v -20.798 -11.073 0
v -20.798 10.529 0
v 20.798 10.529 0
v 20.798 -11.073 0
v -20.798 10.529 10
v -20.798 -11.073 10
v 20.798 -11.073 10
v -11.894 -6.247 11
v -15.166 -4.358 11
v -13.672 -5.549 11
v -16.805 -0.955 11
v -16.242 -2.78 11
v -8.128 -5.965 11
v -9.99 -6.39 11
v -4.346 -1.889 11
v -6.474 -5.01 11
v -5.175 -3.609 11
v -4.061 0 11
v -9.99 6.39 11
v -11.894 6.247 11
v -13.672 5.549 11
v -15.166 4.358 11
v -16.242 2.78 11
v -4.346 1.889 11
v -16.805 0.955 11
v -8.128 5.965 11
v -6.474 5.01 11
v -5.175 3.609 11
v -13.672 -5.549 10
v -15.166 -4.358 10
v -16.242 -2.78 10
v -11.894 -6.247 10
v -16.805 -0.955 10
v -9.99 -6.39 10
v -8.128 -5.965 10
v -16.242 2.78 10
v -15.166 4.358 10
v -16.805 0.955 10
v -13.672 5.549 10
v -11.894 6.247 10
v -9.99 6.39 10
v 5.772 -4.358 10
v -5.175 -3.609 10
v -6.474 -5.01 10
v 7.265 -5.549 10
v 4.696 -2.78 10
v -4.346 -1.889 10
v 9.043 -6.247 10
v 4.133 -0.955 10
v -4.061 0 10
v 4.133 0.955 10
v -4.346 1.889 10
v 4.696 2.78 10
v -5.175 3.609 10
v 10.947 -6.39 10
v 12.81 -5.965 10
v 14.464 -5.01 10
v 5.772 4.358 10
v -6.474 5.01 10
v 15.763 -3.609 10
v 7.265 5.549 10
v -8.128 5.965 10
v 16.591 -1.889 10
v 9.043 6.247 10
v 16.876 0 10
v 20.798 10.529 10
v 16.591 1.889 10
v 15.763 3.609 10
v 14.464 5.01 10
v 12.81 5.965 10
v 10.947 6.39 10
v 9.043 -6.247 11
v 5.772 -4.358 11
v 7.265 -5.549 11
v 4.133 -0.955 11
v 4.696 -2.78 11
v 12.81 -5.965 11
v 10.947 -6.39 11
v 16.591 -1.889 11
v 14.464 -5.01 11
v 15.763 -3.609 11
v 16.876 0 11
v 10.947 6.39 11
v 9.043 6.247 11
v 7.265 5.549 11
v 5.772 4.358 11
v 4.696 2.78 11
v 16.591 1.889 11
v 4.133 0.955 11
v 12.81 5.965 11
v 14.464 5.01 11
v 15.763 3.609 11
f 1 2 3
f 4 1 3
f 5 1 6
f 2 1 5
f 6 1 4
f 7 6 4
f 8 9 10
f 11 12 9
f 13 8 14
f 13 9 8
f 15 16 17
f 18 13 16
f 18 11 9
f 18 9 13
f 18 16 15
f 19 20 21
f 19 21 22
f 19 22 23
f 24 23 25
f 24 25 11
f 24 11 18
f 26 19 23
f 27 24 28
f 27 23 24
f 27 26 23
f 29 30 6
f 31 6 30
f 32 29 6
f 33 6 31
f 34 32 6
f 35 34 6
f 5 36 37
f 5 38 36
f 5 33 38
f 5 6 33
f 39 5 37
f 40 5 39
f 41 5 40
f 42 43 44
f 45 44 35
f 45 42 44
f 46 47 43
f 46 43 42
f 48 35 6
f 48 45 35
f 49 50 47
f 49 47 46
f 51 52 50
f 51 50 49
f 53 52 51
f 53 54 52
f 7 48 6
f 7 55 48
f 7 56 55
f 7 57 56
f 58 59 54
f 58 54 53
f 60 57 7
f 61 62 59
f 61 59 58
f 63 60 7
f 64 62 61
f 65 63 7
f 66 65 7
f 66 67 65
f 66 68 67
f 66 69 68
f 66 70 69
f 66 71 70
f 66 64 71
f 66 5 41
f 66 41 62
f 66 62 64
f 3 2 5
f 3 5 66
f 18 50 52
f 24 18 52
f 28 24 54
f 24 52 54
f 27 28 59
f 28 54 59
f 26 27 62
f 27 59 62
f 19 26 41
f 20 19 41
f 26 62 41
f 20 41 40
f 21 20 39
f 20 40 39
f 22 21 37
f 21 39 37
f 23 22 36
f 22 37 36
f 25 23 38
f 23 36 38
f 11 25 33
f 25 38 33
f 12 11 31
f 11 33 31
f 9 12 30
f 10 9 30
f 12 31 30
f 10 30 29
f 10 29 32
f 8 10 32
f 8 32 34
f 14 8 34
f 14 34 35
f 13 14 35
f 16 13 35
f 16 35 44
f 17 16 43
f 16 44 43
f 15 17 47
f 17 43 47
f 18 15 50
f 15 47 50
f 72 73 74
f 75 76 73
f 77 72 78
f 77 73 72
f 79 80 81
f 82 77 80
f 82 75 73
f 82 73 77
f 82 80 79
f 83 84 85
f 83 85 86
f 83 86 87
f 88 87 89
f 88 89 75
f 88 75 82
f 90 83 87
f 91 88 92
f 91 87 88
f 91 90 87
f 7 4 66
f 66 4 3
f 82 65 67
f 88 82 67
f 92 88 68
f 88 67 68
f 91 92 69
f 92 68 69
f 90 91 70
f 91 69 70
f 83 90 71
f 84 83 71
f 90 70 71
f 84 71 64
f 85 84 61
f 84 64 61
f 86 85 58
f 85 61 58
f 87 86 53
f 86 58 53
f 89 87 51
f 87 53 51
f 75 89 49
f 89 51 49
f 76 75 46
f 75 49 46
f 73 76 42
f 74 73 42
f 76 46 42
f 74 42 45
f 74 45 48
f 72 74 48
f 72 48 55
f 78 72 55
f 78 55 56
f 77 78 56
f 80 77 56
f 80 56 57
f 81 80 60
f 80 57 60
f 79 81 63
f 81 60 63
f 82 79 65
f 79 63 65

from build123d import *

# Parameters (mm, degrees)
EXPORT_W     = 41.596402
EXPORT_H     = 21.602024
PAD_DEPTH    = 10
EXPORT001_R  = 6.407439
PAD001_DEPTH = 1


with BuildPart() as part:
    # Export → Pad (new body)
    with BuildSketch(Plane.XY):
        with Locations((0, -0.272073)):
            Rectangle(EXPORT_W, EXPORT_H)
    extrude(amount=PAD_DEPTH)

    # Export001 (on Face6 of Pad) → Pad001 (join)
    with BuildSketch(Plane.XY.offset(10)):
        with Locations((-10.468659, 0)):
            Circle(EXPORT001_R)
        with Locations((10.468659, 0)):
            Circle(EXPORT001_R)
    extrude(amount=PAD001_DEPTH)


solid = part.part
